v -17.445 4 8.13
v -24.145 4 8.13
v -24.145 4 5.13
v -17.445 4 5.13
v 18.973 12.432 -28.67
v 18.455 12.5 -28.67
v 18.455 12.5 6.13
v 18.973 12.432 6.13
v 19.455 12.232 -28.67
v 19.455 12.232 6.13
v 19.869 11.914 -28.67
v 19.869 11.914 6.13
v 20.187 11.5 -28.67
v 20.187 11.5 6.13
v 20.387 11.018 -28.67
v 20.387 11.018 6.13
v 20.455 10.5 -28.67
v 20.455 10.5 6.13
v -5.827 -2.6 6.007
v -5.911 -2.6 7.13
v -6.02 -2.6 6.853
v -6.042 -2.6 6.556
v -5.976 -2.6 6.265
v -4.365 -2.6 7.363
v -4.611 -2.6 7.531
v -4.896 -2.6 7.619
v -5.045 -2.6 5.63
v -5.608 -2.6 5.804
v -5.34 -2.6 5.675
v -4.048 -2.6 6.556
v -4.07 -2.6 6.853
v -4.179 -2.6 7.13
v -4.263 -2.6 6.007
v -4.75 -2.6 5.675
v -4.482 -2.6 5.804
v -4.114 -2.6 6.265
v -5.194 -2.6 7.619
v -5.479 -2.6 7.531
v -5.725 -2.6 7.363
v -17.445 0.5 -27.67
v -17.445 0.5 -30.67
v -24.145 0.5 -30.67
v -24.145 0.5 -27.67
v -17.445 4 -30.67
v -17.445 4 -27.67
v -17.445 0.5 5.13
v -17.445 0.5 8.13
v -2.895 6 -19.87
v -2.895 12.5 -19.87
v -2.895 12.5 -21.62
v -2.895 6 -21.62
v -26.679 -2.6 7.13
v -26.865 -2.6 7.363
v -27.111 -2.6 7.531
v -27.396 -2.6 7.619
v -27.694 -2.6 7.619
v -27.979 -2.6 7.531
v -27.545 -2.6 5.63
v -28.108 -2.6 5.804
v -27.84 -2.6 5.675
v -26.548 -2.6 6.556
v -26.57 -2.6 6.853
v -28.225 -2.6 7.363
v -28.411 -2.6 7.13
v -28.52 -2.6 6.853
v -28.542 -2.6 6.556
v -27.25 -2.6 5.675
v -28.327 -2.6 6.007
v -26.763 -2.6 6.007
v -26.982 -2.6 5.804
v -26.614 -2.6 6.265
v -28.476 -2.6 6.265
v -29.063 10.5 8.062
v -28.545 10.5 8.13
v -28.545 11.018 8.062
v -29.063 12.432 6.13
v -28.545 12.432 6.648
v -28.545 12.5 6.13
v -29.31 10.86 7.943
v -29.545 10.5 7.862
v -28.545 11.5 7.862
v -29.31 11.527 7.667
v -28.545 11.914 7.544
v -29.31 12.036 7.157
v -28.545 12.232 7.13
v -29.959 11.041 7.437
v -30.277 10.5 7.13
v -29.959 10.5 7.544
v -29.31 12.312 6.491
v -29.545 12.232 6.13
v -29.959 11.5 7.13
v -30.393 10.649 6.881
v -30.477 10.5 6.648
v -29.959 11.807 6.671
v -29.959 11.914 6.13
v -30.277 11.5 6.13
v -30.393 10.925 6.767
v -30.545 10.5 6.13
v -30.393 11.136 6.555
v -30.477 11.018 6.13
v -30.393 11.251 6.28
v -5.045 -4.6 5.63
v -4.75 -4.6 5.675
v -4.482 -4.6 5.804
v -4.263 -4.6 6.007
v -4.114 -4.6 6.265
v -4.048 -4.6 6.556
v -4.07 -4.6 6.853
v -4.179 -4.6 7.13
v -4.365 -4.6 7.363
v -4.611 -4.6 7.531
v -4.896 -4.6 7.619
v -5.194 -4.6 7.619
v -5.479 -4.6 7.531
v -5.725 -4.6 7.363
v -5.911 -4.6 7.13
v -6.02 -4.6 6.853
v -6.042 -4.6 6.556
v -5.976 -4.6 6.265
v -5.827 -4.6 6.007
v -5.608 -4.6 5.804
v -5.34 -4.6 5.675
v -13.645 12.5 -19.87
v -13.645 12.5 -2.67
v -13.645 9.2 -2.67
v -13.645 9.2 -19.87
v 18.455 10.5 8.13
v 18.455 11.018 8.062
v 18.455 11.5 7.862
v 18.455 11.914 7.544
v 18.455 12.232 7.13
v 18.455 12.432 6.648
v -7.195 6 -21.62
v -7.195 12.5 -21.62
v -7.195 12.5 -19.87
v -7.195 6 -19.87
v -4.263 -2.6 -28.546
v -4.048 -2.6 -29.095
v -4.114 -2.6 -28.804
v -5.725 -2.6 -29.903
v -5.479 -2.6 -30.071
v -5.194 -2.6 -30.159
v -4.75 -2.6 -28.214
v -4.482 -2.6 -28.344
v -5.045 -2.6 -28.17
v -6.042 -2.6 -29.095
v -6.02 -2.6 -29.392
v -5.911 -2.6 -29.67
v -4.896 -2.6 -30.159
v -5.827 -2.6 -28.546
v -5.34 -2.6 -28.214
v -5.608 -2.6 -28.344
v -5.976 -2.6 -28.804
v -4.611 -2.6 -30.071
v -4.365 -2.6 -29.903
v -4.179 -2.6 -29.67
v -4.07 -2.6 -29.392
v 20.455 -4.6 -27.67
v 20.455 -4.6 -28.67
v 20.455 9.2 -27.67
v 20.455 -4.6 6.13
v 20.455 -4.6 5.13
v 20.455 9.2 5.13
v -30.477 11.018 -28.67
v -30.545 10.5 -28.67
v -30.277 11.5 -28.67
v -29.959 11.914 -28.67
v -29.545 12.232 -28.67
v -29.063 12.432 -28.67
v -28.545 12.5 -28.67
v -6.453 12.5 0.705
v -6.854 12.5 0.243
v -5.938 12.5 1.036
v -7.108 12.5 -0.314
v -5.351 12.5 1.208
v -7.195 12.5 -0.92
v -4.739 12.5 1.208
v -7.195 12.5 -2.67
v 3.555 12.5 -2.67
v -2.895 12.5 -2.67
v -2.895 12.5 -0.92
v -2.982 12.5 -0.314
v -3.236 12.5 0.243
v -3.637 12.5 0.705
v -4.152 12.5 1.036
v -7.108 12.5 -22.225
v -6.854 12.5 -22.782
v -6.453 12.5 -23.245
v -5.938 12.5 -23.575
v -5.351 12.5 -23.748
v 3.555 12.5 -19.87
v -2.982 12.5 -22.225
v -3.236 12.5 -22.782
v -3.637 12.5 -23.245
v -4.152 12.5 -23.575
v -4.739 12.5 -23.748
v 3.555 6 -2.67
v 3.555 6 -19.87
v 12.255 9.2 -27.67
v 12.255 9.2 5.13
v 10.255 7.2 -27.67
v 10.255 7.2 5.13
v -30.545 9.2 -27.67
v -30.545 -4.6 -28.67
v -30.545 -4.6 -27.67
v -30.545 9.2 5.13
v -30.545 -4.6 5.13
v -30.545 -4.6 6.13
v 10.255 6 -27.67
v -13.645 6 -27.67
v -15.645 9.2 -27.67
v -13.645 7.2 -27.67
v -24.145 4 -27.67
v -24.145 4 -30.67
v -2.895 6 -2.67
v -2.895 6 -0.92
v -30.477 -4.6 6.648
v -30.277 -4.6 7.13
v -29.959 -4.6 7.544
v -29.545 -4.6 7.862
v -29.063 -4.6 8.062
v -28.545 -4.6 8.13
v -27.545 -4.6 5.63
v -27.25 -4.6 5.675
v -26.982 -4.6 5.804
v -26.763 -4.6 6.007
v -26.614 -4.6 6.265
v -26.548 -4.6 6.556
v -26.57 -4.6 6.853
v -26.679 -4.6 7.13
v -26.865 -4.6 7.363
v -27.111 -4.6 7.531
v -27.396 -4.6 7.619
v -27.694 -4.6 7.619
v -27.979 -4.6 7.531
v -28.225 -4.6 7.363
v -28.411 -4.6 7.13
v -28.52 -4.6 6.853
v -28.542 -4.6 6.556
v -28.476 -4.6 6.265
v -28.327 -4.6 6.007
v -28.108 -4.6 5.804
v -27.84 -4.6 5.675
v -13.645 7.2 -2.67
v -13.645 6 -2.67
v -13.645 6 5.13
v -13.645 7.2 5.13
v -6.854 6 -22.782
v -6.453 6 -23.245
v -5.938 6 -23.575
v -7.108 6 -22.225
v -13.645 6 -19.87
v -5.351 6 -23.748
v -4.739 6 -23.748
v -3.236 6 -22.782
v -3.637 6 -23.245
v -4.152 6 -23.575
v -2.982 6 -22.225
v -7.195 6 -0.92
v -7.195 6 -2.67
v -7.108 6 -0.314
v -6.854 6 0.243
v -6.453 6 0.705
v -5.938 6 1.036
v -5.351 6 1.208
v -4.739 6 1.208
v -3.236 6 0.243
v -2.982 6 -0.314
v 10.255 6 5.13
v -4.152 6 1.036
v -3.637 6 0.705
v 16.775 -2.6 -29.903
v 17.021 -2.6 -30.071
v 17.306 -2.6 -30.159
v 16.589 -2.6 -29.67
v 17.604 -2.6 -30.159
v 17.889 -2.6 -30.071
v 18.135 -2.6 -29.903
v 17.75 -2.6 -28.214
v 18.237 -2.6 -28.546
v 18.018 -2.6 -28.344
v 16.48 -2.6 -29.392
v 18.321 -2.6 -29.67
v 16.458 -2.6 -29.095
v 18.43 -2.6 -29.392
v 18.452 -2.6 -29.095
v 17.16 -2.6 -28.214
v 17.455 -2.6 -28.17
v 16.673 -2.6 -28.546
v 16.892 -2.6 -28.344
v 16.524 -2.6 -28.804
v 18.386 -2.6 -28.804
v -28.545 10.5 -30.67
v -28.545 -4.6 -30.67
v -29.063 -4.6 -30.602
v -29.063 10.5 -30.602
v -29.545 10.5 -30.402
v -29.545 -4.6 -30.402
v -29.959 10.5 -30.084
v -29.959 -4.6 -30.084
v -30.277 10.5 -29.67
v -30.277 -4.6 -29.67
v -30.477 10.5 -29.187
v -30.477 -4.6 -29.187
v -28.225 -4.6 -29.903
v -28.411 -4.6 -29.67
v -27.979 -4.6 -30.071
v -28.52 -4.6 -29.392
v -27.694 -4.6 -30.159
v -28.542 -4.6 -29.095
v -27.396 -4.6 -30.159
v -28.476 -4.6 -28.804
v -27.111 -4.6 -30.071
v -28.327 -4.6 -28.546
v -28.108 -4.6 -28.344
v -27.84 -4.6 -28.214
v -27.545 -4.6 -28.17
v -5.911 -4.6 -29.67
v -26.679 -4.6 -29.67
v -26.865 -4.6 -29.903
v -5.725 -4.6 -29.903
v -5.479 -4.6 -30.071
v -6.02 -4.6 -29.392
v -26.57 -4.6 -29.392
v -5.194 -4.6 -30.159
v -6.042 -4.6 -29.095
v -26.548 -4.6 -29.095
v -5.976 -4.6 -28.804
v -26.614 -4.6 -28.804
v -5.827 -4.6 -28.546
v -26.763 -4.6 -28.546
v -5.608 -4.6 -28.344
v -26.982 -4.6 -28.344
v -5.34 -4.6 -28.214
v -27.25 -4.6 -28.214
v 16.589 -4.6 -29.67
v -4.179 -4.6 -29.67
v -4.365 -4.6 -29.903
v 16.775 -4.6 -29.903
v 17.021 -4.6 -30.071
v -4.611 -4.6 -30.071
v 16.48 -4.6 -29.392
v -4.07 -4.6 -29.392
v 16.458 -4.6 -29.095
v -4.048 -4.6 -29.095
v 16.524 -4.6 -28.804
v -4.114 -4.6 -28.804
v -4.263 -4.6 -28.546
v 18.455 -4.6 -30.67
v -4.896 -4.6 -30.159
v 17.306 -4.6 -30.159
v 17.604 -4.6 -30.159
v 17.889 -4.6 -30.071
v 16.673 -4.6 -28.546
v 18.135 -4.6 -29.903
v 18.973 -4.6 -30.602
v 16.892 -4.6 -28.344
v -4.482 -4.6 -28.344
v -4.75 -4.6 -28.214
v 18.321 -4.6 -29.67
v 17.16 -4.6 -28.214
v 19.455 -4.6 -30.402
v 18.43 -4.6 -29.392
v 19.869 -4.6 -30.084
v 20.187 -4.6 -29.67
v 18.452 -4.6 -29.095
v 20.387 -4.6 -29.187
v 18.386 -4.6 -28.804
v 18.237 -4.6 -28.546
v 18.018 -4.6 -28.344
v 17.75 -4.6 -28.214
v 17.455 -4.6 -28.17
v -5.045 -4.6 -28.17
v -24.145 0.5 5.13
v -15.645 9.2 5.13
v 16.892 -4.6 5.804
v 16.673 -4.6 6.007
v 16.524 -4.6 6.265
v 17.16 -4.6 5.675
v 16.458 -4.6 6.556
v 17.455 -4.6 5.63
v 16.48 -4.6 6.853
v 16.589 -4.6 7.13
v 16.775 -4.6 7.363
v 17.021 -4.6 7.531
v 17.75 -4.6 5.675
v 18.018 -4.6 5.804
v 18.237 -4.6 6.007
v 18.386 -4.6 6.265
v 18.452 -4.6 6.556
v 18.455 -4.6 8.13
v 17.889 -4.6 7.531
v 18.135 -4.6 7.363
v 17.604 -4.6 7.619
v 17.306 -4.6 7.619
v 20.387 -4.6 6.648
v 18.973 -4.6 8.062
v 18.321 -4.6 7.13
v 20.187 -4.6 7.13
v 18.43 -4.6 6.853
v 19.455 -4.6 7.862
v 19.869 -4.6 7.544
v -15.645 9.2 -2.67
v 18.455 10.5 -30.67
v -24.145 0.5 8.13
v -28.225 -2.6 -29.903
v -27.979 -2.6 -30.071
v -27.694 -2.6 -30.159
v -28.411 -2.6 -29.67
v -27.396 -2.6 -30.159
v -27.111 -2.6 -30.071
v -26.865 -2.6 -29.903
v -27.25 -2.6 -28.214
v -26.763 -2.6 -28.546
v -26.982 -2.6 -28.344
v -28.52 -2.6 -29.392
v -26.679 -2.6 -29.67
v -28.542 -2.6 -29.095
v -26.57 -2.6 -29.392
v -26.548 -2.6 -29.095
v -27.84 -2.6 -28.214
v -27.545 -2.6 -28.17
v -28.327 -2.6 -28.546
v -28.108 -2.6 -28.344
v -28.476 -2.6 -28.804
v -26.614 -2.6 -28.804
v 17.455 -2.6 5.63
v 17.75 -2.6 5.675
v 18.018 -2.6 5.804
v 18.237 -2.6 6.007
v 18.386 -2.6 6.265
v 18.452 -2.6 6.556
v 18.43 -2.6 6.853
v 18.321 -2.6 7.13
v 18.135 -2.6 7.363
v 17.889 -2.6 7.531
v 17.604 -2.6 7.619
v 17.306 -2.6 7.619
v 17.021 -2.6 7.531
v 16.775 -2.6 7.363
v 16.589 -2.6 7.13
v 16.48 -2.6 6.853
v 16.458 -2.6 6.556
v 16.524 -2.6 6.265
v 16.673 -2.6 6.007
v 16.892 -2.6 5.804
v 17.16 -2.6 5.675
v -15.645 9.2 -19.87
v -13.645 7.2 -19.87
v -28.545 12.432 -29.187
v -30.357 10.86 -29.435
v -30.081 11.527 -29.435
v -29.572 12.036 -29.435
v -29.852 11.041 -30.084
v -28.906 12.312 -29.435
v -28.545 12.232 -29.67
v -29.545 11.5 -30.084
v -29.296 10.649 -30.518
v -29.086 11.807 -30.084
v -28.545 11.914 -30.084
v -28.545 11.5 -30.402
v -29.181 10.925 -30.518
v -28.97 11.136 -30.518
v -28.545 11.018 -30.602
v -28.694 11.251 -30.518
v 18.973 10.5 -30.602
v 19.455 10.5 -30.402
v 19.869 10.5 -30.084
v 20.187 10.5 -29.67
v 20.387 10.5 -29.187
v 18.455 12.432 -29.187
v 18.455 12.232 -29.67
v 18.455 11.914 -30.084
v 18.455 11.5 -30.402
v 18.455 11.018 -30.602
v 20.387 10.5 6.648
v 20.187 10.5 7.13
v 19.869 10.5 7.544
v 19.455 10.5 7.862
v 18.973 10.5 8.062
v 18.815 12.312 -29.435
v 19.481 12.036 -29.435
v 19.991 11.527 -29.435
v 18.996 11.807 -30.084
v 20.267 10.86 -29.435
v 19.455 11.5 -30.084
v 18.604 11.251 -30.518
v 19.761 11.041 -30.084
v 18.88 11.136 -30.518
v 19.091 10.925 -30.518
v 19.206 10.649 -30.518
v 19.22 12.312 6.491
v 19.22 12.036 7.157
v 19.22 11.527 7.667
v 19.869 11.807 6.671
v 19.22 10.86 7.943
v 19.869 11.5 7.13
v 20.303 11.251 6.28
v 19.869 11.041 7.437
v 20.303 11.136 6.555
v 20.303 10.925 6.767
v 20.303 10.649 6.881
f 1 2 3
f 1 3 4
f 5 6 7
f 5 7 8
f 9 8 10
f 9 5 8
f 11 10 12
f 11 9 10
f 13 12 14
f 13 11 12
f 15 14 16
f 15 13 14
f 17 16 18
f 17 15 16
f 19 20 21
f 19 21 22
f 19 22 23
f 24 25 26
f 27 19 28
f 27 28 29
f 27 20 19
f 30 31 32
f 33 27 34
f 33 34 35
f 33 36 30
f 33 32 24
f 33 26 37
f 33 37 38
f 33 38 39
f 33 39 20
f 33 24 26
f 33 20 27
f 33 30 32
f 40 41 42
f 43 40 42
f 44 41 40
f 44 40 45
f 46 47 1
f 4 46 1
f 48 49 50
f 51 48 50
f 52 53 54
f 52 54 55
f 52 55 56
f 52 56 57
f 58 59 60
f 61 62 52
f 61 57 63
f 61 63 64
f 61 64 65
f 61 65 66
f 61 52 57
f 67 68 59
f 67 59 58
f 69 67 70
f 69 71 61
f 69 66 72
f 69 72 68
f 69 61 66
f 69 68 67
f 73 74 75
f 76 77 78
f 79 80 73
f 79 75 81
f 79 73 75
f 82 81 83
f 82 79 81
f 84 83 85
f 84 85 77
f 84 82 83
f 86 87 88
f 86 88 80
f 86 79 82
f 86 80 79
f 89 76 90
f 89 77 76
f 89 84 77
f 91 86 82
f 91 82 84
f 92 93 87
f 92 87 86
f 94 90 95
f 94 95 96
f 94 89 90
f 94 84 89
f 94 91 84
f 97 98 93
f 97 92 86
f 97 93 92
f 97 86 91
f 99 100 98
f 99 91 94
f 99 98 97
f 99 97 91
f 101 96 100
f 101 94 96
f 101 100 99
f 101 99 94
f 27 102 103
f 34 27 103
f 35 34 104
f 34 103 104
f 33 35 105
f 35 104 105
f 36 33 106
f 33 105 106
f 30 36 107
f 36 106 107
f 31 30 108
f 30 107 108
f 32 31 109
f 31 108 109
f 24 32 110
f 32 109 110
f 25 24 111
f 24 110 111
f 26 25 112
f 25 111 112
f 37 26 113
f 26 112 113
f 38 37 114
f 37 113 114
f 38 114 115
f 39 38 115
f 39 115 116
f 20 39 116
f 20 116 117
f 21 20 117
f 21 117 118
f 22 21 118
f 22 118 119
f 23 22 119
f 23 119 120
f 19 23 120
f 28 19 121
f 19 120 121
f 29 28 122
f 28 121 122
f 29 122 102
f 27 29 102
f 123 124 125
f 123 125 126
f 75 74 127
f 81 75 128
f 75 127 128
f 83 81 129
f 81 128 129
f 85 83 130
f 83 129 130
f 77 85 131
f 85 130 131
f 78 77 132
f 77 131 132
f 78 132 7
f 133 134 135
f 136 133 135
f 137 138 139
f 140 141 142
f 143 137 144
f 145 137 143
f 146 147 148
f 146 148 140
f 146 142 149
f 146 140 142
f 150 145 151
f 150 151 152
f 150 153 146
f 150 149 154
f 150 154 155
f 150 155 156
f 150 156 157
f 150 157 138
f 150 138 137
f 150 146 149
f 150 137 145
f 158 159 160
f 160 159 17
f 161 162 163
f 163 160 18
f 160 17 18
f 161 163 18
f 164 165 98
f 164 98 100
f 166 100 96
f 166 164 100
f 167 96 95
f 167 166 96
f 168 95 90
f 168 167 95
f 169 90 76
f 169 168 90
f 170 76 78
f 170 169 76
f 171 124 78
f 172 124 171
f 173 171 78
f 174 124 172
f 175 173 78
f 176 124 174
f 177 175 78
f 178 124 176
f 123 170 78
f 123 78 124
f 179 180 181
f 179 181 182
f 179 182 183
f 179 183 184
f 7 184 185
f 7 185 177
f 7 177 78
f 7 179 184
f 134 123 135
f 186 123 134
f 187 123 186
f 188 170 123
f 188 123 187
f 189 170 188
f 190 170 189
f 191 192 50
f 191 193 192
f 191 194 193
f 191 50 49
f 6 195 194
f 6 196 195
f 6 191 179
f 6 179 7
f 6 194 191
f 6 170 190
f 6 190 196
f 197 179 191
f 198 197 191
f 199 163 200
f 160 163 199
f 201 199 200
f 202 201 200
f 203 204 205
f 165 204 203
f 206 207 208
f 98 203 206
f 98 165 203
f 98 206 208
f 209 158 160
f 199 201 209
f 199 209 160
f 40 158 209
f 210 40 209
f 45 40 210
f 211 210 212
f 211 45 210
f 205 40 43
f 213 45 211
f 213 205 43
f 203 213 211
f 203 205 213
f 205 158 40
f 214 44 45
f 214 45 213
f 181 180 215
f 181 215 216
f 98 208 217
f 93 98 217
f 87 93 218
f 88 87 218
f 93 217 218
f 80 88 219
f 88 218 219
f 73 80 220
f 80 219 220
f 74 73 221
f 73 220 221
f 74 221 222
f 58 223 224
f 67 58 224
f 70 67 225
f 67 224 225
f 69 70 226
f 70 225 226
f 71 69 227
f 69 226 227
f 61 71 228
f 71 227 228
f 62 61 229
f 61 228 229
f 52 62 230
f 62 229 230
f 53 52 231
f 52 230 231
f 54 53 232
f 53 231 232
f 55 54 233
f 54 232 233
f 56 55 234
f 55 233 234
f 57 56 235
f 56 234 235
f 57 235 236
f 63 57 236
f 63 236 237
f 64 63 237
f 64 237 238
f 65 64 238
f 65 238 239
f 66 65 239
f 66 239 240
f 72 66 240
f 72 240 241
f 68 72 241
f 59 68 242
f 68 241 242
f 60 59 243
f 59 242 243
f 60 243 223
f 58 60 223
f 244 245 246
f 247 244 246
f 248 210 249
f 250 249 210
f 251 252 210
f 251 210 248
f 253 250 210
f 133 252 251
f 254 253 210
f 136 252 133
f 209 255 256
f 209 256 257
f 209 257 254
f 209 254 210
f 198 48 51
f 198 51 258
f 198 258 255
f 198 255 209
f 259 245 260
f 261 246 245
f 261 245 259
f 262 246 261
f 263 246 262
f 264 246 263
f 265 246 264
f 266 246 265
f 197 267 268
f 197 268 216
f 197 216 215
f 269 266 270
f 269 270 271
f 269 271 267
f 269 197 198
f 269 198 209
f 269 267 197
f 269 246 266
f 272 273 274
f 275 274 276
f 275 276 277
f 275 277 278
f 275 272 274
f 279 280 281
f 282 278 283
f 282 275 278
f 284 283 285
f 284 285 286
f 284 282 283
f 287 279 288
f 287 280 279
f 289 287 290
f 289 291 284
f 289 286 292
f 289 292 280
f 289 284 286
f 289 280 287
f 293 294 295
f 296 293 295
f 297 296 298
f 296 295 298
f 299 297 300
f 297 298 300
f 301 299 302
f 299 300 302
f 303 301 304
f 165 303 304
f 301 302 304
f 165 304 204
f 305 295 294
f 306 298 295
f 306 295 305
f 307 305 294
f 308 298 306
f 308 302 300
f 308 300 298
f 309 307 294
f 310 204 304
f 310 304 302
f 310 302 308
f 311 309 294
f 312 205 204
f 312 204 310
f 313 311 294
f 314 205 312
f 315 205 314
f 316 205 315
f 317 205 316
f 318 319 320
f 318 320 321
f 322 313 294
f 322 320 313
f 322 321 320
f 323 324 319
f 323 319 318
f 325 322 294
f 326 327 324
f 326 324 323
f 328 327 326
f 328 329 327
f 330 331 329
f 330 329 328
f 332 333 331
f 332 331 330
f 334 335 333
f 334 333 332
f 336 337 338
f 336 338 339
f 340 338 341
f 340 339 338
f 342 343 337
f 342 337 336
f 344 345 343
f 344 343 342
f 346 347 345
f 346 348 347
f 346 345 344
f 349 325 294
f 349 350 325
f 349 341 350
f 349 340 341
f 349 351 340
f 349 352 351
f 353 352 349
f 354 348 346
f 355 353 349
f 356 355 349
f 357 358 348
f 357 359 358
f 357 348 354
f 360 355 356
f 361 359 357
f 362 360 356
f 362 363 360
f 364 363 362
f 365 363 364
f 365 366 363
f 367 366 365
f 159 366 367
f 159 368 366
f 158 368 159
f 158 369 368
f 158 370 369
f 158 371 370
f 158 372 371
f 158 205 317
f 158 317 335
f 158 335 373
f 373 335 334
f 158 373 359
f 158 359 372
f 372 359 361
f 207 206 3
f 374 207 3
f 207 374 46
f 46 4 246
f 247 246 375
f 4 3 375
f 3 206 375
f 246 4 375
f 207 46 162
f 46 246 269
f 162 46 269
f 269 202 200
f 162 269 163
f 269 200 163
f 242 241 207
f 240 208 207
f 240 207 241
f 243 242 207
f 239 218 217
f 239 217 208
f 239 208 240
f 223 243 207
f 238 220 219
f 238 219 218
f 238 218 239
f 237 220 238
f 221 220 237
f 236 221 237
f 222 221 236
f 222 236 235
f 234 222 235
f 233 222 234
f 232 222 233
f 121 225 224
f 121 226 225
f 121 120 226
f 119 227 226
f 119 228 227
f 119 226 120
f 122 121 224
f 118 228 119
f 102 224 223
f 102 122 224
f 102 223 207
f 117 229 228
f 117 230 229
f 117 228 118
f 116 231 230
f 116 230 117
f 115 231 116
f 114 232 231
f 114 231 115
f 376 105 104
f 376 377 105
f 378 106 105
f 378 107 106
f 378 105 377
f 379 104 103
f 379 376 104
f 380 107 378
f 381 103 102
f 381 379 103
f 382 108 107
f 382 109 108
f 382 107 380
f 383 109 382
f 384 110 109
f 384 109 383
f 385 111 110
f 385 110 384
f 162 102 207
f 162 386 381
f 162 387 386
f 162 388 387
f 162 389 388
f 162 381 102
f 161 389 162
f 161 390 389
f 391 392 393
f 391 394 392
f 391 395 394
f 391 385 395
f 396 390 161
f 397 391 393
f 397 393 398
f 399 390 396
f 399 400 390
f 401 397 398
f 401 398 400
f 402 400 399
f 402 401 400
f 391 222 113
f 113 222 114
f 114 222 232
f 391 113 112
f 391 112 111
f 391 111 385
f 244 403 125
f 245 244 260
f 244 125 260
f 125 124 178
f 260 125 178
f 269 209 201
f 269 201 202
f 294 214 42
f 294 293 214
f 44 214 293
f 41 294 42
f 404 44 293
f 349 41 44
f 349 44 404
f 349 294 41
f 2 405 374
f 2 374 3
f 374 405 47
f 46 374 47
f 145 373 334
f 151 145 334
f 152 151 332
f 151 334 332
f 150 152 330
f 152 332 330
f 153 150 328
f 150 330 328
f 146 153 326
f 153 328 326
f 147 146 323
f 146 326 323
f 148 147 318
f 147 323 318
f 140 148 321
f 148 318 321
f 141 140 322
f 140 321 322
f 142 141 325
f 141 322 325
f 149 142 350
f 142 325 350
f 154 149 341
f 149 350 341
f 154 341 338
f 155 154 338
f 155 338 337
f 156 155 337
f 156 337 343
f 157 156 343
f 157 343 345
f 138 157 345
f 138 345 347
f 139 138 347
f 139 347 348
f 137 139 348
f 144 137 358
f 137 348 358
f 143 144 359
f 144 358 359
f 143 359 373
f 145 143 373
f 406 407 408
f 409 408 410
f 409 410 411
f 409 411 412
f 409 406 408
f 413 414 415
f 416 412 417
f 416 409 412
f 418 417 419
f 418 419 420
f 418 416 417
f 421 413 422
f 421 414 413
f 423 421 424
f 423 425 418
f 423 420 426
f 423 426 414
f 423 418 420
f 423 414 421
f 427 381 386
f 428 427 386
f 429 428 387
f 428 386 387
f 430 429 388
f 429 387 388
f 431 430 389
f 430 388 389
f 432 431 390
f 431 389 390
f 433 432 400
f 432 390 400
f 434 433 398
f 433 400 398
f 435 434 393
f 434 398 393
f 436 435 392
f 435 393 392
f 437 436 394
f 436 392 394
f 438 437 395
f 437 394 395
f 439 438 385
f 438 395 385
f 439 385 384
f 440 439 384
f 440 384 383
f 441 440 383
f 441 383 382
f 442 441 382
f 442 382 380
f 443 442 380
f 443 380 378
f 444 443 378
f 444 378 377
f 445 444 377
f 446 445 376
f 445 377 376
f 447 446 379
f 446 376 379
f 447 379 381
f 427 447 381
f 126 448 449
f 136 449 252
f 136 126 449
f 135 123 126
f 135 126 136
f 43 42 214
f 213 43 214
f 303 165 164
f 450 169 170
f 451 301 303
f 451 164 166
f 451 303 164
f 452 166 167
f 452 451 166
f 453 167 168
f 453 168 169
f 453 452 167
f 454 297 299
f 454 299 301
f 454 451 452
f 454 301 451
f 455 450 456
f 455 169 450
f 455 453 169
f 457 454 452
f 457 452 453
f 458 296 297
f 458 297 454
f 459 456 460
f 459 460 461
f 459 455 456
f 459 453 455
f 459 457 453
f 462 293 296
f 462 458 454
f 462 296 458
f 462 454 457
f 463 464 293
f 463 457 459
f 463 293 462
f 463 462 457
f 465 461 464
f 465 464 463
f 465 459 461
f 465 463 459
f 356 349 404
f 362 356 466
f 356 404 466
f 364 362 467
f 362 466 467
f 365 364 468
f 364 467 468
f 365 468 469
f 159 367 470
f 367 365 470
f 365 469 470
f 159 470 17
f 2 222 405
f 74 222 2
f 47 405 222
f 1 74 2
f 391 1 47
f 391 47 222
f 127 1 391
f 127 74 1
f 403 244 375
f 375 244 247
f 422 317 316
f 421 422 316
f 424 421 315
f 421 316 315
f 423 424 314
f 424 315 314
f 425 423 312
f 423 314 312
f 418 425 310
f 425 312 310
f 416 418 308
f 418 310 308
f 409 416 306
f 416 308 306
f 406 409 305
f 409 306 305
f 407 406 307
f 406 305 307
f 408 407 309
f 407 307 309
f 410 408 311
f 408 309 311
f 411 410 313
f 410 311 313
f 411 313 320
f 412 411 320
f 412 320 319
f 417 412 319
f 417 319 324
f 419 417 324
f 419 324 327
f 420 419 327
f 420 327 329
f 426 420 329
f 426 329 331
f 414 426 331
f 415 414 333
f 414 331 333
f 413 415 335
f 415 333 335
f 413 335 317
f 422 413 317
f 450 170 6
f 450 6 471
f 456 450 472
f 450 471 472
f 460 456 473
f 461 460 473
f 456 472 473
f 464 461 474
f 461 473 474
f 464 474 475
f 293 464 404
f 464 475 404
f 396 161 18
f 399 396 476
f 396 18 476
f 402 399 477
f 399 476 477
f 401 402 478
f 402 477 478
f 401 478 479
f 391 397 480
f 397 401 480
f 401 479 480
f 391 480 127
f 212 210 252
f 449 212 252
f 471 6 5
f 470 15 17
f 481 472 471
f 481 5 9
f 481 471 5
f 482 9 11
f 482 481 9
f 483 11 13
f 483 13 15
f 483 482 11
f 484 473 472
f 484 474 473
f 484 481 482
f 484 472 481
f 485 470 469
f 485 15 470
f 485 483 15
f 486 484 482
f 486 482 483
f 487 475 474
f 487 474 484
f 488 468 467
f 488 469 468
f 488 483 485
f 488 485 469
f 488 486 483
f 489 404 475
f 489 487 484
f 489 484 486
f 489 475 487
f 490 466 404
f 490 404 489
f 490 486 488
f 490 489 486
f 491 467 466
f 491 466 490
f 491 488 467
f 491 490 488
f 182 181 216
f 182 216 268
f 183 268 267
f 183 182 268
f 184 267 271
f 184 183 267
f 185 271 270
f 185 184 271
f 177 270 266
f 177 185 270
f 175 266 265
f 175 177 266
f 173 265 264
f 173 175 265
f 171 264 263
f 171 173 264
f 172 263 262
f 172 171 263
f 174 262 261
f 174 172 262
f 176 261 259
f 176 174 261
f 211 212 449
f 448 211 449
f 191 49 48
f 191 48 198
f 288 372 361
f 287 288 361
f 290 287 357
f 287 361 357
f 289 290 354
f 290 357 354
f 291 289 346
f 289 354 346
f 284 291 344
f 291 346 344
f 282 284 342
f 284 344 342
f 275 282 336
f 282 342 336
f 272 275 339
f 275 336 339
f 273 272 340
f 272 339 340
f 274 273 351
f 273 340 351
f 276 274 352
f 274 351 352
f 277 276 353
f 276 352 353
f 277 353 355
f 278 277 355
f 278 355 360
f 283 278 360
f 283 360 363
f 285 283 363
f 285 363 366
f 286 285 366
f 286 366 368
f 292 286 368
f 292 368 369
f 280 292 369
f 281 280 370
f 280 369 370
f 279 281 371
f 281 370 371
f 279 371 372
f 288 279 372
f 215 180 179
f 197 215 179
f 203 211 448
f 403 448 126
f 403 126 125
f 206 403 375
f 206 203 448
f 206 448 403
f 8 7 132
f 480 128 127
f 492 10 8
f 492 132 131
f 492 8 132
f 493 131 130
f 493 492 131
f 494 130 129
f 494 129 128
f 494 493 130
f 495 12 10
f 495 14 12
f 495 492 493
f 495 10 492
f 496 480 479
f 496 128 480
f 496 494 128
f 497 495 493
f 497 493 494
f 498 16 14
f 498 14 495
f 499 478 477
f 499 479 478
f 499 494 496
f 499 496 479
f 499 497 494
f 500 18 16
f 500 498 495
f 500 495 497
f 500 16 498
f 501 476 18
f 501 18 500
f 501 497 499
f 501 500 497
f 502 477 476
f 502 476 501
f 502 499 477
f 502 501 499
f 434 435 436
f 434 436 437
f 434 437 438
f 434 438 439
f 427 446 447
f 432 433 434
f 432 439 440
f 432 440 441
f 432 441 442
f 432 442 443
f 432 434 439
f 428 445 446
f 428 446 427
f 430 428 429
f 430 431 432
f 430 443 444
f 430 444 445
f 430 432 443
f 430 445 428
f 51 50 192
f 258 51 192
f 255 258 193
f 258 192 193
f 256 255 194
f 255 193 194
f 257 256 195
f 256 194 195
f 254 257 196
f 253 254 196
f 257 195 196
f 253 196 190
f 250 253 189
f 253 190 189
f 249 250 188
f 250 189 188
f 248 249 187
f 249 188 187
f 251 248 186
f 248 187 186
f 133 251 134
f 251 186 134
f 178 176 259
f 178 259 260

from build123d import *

# Parameters (mm, degrees)
CROQUIS2_W              = 51
CROQUIS2_H              = 38.8
SALIENTE_EXTRUIR2_DEPTH = 12.5
CROQUIS8_W              = 45
CROQUIS8_H              = 32.8
CORTAR_EXTRUIR3_DEPTH   = 6
CROQUIS10_W             = 17.2
CROQUIS10_H             = 17.2
CORTAR_EXTRUIR4_DEPTH   = 10
CROQUIS12_W             = 7.2
CROQUIS12_H             = 32.8
CORTAR_EXTRUIR5_DEPTH   = 3.2
CROQUIS13_W             = 13.9
CROQUIS13_H             = 32.8
CORTAR_EXTRUIR6_DEPTH   = 3.2
CROQUIS14_W             = 32.8
CROQUIS14_H             = 9.2
CORTAR_EXTRUIR7_DEPTH   = 3.2
CROQUIS16_W             = 32.8
CROQUIS16_H             = 9.2
CORTAR_EXTRUIR8_DEPTH   = 3.2
CROQUIS17_W             = 51
CROQUIS17_H             = 3
SALIENTE_EXTRUIR3_DEPTH = 4.6
CROQUIS18_W             = 6.7
CROQUIS18_H             = 3.5
CORTAR_EXTRUIR9_DEPTH   = 4.6
CROQUIS19_W             = 6.7
CROQUIS19_H             = 3.5
CORTAR_EXTRUIR10_DEPTH  = 4.6
REDONDEO1_R             = 2
CROQUIS22_R             = 1
CORTAR_EXTRUIR11_DEPTH  = 2
REDONDEO2_R             = 2
CHAFL_N1_SIZE           = 2
CHAFL_N2_SIZE           = 2
CORTAR_EXTRUIR12_DEPTH  = 10


with BuildPart() as part:
    # Croquis2 → Saliente-Extruir2 (new body)
    with BuildSketch(Plane(origin=(0, 0, 0), x_dir=(1, 0, 0), z_dir=(0, 1, 0))):
        with Locations((-5.045084746, 11.269745763)):
            Rectangle(CROQUIS2_W, CROQUIS2_H)
    extrude(amount=SALIENTE_EXTRUIR2_DEPTH)

    # Croquis8 → Cortar-Extruir3 (cut)
    with BuildSketch(Plane.XZ):
        with Locations((-5.045084746, -11.269745763)):
            Rectangle(CROQUIS8_W, CROQUIS8_H)
    extrude(amount=-CORTAR_EXTRUIR3_DEPTH, mode=Mode.SUBTRACT)

    # Croquis10 → Cortar-Extruir4 (cut)
    with BuildSketch(Plane(origin=(0, 12.5, 0), x_dir=(1, 0, 0), z_dir=(0, 1, 0))):
        with Locations((-5.045084746, 11.269745763)):
            Rectangle(CROQUIS10_W, CROQUIS10_H)
    extrude(amount=-CORTAR_EXTRUIR4_DEPTH, mode=Mode.SUBTRACT)

    # Croquis12 → Cortar-Extruir5 (cut)
    with BuildSketch(Plane.XZ.offset(-6)):
        with Locations((13.854915254, -11.269745763)):
            Rectangle(CROQUIS12_W, CROQUIS12_H)
    extrude(amount=-CORTAR_EXTRUIR5_DEPTH, mode=Mode.SUBTRACT)

    # Croquis13 → Cortar-Extruir6 (cut)
    with BuildSketch(Plane.XZ.offset(-6)):
        with Locations((-20.595084746, -11.269745763)):
            Rectangle(CROQUIS13_W, CROQUIS13_H)
    extrude(amount=-CORTAR_EXTRUIR6_DEPTH, mode=Mode.SUBTRACT)

    # Croquis14 → Cortar-Extruir7 (cut)
    with BuildSketch(Plane(origin=(20.454915254, 0, 0), x_dir=(0, 0, -1), z_dir=(1, 0, 0))):
        with Locations((11.269745763, 4.6)):
            Rectangle(CROQUIS14_W, CROQUIS14_H)
    extrude(amount=-CORTAR_EXTRUIR7_DEPTH, mode=Mode.SUBTRACT)

    # Croquis16 → Cortar-Extruir8 (cut)
    with BuildSketch(Plane.ZY.offset(30.545084746)):
        with Locations((-11.269745763, 4.6)):
            Rectangle(CROQUIS16_W, CROQUIS16_H)
    extrude(amount=-CORTAR_EXTRUIR8_DEPTH, mode=Mode.SUBTRACT)

    # Croquis17 → Saliente-Extruir3 (add)
    with BuildSketch(Plane.XZ):
        with Locations((-5.045084746, 6.630254237)):
            Rectangle(CROQUIS17_W, CROQUIS17_H)
        with Locations((-5.045084746, -29.169745763)):
            Rectangle(CROQUIS17_W, CROQUIS17_H)
    extrude(amount=SALIENTE_EXTRUIR3_DEPTH)

    # Croquis18 → Cortar-Extruir9 (cut)
    with BuildSketch(Plane.XY.offset(8.130254237)):
        with Locations((-20.795084746, 2.25)):
            Rectangle(CROQUIS18_W, CROQUIS18_H)
    extrude(amount=-CORTAR_EXTRUIR9_DEPTH, mode=Mode.SUBTRACT)

    # Croquis19 → Cortar-Extruir10 (cut)
    with BuildSketch(Plane(origin=(0, 0, -30.669745763), x_dir=(-1, 0, 0), z_dir=(0, 0, -1))):
        with Locations((20.795084746, 2.25)):
            Rectangle(CROQUIS19_W, CROQUIS19_H)
    extrude(amount=-CORTAR_EXTRUIR10_DEPTH, mode=Mode.SUBTRACT)

    # Redondeo1
    redondeo1_edges = [part.edges().sort_by_distance(p)[0] for p in [
        (20.454915254, 12.5, -11.269745763),
        (-5.045084746, 12.5, -30.669745763),
        (-30.545084746, 12.5, -11.269745763),
        (-5.045084746, 12.5, 8.130254237),
    ]]
    fillet(redondeo1_edges, radius=REDONDEO1_R)

    # Croquis22 → Cortar-Extruir11 (cut)
    with BuildSketch(Plane.XZ.offset(4.6)):
        with Locations(Location((-27.545084746, 6.630254237, 0), (0, 0, 270))):
            Circle(CROQUIS22_R)
        with Locations(Location((-5.045084746, 6.630254237, 0), (0, 0, 270))):
            Circle(CROQUIS22_R)
        with Locations(Location((17.454915254, 6.630254237, 0), (0, 0, 270))):
            Circle(CROQUIS22_R)
        with Locations(Location((17.454915254, -29.169745763, 0), (0, 0, 90))):
            Circle(CROQUIS22_R)
        with Locations(Location((-5.045084746, -29.169745763, 0), (0, 0, 90))):
            Circle(CROQUIS22_R)
        with Locations(Location((-27.545084746, -29.169745763, 0), (0, 0, 90))):
            Circle(CROQUIS22_R)
    extrude(amount=-CORTAR_EXTRUIR11_DEPTH, mode=Mode.SUBTRACT)

    # Redondeo2
    # the kernel refuses this fillet: 2 mm, written as the material it takes off along each edge
    with BuildSketch(Plane(origin=(18.454915254, 10.5, -28.669745763), x_dir=(1, 0, 0), z_dir=(0, 0, -1))) as redondeo2_piece_1_section:
        Polygon((0, 0), (REDONDEO2_R, 0), (REDONDEO2_R, -REDONDEO2_R), (0, -REDONDEO2_R), align=None)
    redondeo2_piece_1 = extrude(amount=REDONDEO2_R, mode=Mode.PRIVATE)
    redondeo2_piece_1 = redondeo2_piece_1 - Plane(origin=(18.454915254, 10.5, -28.669745763), x_dir=(-0.7071067811865475, -0.7071067811865475, 0), z_dir=(0, 0, -1)) * Sphere(REDONDEO2_R, mode=Mode.PRIVATE)
    add(redondeo2_piece_1, mode=Mode.SUBTRACT)
    with BuildSketch(Plane(origin=(18.454915254, 10.5, 6.130254237), x_dir=(0, 0, 1), z_dir=(1, 0, 0))) as redondeo2_piece_2_section:
        Polygon((0, 0), (REDONDEO2_R, 0), (REDONDEO2_R, -REDONDEO2_R), (0, -REDONDEO2_R), align=None)
    redondeo2_piece_2 = extrude(amount=REDONDEO2_R, mode=Mode.PRIVATE)
    redondeo2_piece_2 = redondeo2_piece_2 - Plane(origin=(18.454915254, 10.5, 6.130254237), x_dir=(0, -0.7071067811865475, -0.7071067811865475), z_dir=(1, 0, 0)) * Sphere(REDONDEO2_R, mode=Mode.PRIVATE)
    add(redondeo2_piece_2, mode=Mode.SUBTRACT)
    with BuildSketch(Plane(origin=(-28.545084746, 10.5, -28.669745763), x_dir=(-1, 0, 0), z_dir=(0, 0, -1))) as redondeo2_piece_3_section:
        Polygon((0, 0), (REDONDEO2_R, 0), (REDONDEO2_R, REDONDEO2_R), (0, REDONDEO2_R), align=None)
    redondeo2_piece_3 = extrude(amount=REDONDEO2_R, mode=Mode.PRIVATE)
    redondeo2_piece_3 = redondeo2_piece_3 - Plane(origin=(-28.545084746, 10.5, -28.669745763), x_dir=(0.7071067811865475, -0.7071067811865475, 0), z_dir=(0, 0, -1)) * Sphere(REDONDEO2_R, mode=Mode.PRIVATE)
    add(redondeo2_piece_3, mode=Mode.SUBTRACT)
    with BuildSketch(Plane(origin=(-28.545084746, 10.5, 6.130254237), x_dir=(0, 0, 1), z_dir=(-1, 0, 0))) as redondeo2_piece_4_section:
        Polygon((0, 0), (REDONDEO2_R, 0), (REDONDEO2_R, REDONDEO2_R), (0, REDONDEO2_R), align=None)
    redondeo2_piece_4 = extrude(amount=REDONDEO2_R, mode=Mode.PRIVATE)
    redondeo2_piece_4 = redondeo2_piece_4 - Plane(origin=(-28.545084746, 10.5, 6.130254237), x_dir=(0, -0.7071067811865475, -0.7071067811865475), z_dir=(-1, 0, 0)) * Sphere(REDONDEO2_R, mode=Mode.PRIVATE)
    add(redondeo2_piece_4, mode=Mode.SUBTRACT)
    with BuildSketch(Plane(origin=(-30.545084746, -9.6, -30.669745763), x_dir=(1, 0, 0), z_dir=(0, 1, 0)), Plane(origin=(-30.545084746, -9.6, 8.130254237), x_dir=(0, 0, -1), z_dir=(0, 1, 0)), Plane(origin=(20.454915254, 10.5, 8.130254237), x_dir=(0, 0, -1), z_dir=(0, -1, 0)), Plane(origin=(20.454915254, 10.5, -30.669745763), x_dir=(-1, 0, 0), z_dir=(0, -1, 0))) as redondeo2_piece_5:
        with BuildLine():
            CenterArc((REDONDEO2_R, -REDONDEO2_R), REDONDEO2_R, 90, 90)
            Line((0, -REDONDEO2_R), (0, 0))
            Line((0, 0), (REDONDEO2_R, 0))
        make_face()
    extrude(amount=20.1, mode=Mode.SUBTRACT)

    # Chaflán1
    chafl_n1_edges = [part.edges().sort_by_distance(p)[0] for p in [
        (-13.645084746, 9.2, 1.230254237),
        (-13.645084746, 9.2, -23.769745763),
    ]]
    chamfer(chafl_n1_edges, length=CHAFL_N1_SIZE)

    # Chaflán2
    chafl_n2_edges = [part.edges().sort_by_distance(p)[0] for p in [
        (10.254915254, 9.2, -11.269745763),
    ]]
    chamfer(chafl_n2_edges, length=CHAFL_N2_SIZE)

    # Croquis27 → Cortar-Extruir12 (cut)
    with BuildSketch(Plane(origin=(0, 12.5, 0), x_dir=(1, 0, 0), z_dir=(0, 1, 0))):
        with BuildLine():
            Line((-7.195084746, 2.669745763), (-2.895084746, 2.669745763))
            Line((-2.895084746, 2.669745763), (-2.895084746, 0.919745763))
            ThreePointArc((-2.895084746, 0.919745763), (-5.045084746, -1.230254237), (-7.195084746, 0.919745763))
            Line((-7.195084746, 0.919745763), (-7.195084746, 2.669745763))
        make_face()
        with BuildLine():
            Line((-7.195084746, 19.869745763), (-2.895084746, 19.869745763))
            Line((-2.895084746, 19.869745763), (-2.895084746, 21.619745763))
            ThreePointArc((-2.895084746, 21.619745763), (-5.045084746, 23.769745763), (-7.195084746, 21.619745763))
            Line((-7.195084746, 21.619745763), (-7.195084746, 19.869745763))
        make_face()
    extrude(amount=-CORTAR_EXTRUIR12_DEPTH, mode=Mode.SUBTRACT)


solid = part.part
